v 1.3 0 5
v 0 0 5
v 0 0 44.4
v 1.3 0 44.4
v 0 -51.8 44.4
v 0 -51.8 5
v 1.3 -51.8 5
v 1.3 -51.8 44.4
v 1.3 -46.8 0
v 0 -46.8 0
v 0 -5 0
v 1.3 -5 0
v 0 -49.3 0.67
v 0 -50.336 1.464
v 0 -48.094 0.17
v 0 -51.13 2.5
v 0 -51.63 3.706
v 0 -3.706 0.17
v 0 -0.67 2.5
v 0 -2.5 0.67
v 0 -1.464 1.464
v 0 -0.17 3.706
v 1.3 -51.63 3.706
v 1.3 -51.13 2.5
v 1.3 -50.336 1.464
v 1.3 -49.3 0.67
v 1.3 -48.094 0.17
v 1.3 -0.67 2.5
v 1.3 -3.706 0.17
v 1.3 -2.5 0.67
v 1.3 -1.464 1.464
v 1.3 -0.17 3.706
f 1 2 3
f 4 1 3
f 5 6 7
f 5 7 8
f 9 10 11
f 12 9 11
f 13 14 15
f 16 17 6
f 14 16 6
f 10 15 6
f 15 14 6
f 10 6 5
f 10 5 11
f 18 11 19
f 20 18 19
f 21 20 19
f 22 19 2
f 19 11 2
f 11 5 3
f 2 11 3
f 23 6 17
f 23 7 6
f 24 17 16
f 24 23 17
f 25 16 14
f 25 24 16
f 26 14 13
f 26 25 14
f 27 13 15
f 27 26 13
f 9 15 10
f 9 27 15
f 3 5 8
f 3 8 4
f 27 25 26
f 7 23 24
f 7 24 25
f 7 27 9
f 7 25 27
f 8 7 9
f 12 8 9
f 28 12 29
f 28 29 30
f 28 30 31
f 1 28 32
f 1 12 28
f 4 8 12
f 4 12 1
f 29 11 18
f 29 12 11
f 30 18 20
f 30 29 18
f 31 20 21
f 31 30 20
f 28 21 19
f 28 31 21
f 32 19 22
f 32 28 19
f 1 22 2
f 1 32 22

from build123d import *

# Parameters (mm, degrees)
F0_W     = 51.8
F0_H     = 44.4
F1_DEPTH = 1.3
F2_R     = 5


with BuildPart() as f1:
    # F0 (on Right) → F1 (new body)
    with BuildSketch(Plane.YZ):
        with Locations((-25.9, 22.2)):
            Rectangle(F0_W, F0_H)
    extrude(amount=F1_DEPTH)

    # F2
    f2_edges = [f1.edges().sort_by_distance(p)[0] for p in [
        (0.65, -51.8, 0),
        (0.65, 0, 0),
    ]]
    fillet(f2_edges, radius=F2_R)


solid = f1.part
